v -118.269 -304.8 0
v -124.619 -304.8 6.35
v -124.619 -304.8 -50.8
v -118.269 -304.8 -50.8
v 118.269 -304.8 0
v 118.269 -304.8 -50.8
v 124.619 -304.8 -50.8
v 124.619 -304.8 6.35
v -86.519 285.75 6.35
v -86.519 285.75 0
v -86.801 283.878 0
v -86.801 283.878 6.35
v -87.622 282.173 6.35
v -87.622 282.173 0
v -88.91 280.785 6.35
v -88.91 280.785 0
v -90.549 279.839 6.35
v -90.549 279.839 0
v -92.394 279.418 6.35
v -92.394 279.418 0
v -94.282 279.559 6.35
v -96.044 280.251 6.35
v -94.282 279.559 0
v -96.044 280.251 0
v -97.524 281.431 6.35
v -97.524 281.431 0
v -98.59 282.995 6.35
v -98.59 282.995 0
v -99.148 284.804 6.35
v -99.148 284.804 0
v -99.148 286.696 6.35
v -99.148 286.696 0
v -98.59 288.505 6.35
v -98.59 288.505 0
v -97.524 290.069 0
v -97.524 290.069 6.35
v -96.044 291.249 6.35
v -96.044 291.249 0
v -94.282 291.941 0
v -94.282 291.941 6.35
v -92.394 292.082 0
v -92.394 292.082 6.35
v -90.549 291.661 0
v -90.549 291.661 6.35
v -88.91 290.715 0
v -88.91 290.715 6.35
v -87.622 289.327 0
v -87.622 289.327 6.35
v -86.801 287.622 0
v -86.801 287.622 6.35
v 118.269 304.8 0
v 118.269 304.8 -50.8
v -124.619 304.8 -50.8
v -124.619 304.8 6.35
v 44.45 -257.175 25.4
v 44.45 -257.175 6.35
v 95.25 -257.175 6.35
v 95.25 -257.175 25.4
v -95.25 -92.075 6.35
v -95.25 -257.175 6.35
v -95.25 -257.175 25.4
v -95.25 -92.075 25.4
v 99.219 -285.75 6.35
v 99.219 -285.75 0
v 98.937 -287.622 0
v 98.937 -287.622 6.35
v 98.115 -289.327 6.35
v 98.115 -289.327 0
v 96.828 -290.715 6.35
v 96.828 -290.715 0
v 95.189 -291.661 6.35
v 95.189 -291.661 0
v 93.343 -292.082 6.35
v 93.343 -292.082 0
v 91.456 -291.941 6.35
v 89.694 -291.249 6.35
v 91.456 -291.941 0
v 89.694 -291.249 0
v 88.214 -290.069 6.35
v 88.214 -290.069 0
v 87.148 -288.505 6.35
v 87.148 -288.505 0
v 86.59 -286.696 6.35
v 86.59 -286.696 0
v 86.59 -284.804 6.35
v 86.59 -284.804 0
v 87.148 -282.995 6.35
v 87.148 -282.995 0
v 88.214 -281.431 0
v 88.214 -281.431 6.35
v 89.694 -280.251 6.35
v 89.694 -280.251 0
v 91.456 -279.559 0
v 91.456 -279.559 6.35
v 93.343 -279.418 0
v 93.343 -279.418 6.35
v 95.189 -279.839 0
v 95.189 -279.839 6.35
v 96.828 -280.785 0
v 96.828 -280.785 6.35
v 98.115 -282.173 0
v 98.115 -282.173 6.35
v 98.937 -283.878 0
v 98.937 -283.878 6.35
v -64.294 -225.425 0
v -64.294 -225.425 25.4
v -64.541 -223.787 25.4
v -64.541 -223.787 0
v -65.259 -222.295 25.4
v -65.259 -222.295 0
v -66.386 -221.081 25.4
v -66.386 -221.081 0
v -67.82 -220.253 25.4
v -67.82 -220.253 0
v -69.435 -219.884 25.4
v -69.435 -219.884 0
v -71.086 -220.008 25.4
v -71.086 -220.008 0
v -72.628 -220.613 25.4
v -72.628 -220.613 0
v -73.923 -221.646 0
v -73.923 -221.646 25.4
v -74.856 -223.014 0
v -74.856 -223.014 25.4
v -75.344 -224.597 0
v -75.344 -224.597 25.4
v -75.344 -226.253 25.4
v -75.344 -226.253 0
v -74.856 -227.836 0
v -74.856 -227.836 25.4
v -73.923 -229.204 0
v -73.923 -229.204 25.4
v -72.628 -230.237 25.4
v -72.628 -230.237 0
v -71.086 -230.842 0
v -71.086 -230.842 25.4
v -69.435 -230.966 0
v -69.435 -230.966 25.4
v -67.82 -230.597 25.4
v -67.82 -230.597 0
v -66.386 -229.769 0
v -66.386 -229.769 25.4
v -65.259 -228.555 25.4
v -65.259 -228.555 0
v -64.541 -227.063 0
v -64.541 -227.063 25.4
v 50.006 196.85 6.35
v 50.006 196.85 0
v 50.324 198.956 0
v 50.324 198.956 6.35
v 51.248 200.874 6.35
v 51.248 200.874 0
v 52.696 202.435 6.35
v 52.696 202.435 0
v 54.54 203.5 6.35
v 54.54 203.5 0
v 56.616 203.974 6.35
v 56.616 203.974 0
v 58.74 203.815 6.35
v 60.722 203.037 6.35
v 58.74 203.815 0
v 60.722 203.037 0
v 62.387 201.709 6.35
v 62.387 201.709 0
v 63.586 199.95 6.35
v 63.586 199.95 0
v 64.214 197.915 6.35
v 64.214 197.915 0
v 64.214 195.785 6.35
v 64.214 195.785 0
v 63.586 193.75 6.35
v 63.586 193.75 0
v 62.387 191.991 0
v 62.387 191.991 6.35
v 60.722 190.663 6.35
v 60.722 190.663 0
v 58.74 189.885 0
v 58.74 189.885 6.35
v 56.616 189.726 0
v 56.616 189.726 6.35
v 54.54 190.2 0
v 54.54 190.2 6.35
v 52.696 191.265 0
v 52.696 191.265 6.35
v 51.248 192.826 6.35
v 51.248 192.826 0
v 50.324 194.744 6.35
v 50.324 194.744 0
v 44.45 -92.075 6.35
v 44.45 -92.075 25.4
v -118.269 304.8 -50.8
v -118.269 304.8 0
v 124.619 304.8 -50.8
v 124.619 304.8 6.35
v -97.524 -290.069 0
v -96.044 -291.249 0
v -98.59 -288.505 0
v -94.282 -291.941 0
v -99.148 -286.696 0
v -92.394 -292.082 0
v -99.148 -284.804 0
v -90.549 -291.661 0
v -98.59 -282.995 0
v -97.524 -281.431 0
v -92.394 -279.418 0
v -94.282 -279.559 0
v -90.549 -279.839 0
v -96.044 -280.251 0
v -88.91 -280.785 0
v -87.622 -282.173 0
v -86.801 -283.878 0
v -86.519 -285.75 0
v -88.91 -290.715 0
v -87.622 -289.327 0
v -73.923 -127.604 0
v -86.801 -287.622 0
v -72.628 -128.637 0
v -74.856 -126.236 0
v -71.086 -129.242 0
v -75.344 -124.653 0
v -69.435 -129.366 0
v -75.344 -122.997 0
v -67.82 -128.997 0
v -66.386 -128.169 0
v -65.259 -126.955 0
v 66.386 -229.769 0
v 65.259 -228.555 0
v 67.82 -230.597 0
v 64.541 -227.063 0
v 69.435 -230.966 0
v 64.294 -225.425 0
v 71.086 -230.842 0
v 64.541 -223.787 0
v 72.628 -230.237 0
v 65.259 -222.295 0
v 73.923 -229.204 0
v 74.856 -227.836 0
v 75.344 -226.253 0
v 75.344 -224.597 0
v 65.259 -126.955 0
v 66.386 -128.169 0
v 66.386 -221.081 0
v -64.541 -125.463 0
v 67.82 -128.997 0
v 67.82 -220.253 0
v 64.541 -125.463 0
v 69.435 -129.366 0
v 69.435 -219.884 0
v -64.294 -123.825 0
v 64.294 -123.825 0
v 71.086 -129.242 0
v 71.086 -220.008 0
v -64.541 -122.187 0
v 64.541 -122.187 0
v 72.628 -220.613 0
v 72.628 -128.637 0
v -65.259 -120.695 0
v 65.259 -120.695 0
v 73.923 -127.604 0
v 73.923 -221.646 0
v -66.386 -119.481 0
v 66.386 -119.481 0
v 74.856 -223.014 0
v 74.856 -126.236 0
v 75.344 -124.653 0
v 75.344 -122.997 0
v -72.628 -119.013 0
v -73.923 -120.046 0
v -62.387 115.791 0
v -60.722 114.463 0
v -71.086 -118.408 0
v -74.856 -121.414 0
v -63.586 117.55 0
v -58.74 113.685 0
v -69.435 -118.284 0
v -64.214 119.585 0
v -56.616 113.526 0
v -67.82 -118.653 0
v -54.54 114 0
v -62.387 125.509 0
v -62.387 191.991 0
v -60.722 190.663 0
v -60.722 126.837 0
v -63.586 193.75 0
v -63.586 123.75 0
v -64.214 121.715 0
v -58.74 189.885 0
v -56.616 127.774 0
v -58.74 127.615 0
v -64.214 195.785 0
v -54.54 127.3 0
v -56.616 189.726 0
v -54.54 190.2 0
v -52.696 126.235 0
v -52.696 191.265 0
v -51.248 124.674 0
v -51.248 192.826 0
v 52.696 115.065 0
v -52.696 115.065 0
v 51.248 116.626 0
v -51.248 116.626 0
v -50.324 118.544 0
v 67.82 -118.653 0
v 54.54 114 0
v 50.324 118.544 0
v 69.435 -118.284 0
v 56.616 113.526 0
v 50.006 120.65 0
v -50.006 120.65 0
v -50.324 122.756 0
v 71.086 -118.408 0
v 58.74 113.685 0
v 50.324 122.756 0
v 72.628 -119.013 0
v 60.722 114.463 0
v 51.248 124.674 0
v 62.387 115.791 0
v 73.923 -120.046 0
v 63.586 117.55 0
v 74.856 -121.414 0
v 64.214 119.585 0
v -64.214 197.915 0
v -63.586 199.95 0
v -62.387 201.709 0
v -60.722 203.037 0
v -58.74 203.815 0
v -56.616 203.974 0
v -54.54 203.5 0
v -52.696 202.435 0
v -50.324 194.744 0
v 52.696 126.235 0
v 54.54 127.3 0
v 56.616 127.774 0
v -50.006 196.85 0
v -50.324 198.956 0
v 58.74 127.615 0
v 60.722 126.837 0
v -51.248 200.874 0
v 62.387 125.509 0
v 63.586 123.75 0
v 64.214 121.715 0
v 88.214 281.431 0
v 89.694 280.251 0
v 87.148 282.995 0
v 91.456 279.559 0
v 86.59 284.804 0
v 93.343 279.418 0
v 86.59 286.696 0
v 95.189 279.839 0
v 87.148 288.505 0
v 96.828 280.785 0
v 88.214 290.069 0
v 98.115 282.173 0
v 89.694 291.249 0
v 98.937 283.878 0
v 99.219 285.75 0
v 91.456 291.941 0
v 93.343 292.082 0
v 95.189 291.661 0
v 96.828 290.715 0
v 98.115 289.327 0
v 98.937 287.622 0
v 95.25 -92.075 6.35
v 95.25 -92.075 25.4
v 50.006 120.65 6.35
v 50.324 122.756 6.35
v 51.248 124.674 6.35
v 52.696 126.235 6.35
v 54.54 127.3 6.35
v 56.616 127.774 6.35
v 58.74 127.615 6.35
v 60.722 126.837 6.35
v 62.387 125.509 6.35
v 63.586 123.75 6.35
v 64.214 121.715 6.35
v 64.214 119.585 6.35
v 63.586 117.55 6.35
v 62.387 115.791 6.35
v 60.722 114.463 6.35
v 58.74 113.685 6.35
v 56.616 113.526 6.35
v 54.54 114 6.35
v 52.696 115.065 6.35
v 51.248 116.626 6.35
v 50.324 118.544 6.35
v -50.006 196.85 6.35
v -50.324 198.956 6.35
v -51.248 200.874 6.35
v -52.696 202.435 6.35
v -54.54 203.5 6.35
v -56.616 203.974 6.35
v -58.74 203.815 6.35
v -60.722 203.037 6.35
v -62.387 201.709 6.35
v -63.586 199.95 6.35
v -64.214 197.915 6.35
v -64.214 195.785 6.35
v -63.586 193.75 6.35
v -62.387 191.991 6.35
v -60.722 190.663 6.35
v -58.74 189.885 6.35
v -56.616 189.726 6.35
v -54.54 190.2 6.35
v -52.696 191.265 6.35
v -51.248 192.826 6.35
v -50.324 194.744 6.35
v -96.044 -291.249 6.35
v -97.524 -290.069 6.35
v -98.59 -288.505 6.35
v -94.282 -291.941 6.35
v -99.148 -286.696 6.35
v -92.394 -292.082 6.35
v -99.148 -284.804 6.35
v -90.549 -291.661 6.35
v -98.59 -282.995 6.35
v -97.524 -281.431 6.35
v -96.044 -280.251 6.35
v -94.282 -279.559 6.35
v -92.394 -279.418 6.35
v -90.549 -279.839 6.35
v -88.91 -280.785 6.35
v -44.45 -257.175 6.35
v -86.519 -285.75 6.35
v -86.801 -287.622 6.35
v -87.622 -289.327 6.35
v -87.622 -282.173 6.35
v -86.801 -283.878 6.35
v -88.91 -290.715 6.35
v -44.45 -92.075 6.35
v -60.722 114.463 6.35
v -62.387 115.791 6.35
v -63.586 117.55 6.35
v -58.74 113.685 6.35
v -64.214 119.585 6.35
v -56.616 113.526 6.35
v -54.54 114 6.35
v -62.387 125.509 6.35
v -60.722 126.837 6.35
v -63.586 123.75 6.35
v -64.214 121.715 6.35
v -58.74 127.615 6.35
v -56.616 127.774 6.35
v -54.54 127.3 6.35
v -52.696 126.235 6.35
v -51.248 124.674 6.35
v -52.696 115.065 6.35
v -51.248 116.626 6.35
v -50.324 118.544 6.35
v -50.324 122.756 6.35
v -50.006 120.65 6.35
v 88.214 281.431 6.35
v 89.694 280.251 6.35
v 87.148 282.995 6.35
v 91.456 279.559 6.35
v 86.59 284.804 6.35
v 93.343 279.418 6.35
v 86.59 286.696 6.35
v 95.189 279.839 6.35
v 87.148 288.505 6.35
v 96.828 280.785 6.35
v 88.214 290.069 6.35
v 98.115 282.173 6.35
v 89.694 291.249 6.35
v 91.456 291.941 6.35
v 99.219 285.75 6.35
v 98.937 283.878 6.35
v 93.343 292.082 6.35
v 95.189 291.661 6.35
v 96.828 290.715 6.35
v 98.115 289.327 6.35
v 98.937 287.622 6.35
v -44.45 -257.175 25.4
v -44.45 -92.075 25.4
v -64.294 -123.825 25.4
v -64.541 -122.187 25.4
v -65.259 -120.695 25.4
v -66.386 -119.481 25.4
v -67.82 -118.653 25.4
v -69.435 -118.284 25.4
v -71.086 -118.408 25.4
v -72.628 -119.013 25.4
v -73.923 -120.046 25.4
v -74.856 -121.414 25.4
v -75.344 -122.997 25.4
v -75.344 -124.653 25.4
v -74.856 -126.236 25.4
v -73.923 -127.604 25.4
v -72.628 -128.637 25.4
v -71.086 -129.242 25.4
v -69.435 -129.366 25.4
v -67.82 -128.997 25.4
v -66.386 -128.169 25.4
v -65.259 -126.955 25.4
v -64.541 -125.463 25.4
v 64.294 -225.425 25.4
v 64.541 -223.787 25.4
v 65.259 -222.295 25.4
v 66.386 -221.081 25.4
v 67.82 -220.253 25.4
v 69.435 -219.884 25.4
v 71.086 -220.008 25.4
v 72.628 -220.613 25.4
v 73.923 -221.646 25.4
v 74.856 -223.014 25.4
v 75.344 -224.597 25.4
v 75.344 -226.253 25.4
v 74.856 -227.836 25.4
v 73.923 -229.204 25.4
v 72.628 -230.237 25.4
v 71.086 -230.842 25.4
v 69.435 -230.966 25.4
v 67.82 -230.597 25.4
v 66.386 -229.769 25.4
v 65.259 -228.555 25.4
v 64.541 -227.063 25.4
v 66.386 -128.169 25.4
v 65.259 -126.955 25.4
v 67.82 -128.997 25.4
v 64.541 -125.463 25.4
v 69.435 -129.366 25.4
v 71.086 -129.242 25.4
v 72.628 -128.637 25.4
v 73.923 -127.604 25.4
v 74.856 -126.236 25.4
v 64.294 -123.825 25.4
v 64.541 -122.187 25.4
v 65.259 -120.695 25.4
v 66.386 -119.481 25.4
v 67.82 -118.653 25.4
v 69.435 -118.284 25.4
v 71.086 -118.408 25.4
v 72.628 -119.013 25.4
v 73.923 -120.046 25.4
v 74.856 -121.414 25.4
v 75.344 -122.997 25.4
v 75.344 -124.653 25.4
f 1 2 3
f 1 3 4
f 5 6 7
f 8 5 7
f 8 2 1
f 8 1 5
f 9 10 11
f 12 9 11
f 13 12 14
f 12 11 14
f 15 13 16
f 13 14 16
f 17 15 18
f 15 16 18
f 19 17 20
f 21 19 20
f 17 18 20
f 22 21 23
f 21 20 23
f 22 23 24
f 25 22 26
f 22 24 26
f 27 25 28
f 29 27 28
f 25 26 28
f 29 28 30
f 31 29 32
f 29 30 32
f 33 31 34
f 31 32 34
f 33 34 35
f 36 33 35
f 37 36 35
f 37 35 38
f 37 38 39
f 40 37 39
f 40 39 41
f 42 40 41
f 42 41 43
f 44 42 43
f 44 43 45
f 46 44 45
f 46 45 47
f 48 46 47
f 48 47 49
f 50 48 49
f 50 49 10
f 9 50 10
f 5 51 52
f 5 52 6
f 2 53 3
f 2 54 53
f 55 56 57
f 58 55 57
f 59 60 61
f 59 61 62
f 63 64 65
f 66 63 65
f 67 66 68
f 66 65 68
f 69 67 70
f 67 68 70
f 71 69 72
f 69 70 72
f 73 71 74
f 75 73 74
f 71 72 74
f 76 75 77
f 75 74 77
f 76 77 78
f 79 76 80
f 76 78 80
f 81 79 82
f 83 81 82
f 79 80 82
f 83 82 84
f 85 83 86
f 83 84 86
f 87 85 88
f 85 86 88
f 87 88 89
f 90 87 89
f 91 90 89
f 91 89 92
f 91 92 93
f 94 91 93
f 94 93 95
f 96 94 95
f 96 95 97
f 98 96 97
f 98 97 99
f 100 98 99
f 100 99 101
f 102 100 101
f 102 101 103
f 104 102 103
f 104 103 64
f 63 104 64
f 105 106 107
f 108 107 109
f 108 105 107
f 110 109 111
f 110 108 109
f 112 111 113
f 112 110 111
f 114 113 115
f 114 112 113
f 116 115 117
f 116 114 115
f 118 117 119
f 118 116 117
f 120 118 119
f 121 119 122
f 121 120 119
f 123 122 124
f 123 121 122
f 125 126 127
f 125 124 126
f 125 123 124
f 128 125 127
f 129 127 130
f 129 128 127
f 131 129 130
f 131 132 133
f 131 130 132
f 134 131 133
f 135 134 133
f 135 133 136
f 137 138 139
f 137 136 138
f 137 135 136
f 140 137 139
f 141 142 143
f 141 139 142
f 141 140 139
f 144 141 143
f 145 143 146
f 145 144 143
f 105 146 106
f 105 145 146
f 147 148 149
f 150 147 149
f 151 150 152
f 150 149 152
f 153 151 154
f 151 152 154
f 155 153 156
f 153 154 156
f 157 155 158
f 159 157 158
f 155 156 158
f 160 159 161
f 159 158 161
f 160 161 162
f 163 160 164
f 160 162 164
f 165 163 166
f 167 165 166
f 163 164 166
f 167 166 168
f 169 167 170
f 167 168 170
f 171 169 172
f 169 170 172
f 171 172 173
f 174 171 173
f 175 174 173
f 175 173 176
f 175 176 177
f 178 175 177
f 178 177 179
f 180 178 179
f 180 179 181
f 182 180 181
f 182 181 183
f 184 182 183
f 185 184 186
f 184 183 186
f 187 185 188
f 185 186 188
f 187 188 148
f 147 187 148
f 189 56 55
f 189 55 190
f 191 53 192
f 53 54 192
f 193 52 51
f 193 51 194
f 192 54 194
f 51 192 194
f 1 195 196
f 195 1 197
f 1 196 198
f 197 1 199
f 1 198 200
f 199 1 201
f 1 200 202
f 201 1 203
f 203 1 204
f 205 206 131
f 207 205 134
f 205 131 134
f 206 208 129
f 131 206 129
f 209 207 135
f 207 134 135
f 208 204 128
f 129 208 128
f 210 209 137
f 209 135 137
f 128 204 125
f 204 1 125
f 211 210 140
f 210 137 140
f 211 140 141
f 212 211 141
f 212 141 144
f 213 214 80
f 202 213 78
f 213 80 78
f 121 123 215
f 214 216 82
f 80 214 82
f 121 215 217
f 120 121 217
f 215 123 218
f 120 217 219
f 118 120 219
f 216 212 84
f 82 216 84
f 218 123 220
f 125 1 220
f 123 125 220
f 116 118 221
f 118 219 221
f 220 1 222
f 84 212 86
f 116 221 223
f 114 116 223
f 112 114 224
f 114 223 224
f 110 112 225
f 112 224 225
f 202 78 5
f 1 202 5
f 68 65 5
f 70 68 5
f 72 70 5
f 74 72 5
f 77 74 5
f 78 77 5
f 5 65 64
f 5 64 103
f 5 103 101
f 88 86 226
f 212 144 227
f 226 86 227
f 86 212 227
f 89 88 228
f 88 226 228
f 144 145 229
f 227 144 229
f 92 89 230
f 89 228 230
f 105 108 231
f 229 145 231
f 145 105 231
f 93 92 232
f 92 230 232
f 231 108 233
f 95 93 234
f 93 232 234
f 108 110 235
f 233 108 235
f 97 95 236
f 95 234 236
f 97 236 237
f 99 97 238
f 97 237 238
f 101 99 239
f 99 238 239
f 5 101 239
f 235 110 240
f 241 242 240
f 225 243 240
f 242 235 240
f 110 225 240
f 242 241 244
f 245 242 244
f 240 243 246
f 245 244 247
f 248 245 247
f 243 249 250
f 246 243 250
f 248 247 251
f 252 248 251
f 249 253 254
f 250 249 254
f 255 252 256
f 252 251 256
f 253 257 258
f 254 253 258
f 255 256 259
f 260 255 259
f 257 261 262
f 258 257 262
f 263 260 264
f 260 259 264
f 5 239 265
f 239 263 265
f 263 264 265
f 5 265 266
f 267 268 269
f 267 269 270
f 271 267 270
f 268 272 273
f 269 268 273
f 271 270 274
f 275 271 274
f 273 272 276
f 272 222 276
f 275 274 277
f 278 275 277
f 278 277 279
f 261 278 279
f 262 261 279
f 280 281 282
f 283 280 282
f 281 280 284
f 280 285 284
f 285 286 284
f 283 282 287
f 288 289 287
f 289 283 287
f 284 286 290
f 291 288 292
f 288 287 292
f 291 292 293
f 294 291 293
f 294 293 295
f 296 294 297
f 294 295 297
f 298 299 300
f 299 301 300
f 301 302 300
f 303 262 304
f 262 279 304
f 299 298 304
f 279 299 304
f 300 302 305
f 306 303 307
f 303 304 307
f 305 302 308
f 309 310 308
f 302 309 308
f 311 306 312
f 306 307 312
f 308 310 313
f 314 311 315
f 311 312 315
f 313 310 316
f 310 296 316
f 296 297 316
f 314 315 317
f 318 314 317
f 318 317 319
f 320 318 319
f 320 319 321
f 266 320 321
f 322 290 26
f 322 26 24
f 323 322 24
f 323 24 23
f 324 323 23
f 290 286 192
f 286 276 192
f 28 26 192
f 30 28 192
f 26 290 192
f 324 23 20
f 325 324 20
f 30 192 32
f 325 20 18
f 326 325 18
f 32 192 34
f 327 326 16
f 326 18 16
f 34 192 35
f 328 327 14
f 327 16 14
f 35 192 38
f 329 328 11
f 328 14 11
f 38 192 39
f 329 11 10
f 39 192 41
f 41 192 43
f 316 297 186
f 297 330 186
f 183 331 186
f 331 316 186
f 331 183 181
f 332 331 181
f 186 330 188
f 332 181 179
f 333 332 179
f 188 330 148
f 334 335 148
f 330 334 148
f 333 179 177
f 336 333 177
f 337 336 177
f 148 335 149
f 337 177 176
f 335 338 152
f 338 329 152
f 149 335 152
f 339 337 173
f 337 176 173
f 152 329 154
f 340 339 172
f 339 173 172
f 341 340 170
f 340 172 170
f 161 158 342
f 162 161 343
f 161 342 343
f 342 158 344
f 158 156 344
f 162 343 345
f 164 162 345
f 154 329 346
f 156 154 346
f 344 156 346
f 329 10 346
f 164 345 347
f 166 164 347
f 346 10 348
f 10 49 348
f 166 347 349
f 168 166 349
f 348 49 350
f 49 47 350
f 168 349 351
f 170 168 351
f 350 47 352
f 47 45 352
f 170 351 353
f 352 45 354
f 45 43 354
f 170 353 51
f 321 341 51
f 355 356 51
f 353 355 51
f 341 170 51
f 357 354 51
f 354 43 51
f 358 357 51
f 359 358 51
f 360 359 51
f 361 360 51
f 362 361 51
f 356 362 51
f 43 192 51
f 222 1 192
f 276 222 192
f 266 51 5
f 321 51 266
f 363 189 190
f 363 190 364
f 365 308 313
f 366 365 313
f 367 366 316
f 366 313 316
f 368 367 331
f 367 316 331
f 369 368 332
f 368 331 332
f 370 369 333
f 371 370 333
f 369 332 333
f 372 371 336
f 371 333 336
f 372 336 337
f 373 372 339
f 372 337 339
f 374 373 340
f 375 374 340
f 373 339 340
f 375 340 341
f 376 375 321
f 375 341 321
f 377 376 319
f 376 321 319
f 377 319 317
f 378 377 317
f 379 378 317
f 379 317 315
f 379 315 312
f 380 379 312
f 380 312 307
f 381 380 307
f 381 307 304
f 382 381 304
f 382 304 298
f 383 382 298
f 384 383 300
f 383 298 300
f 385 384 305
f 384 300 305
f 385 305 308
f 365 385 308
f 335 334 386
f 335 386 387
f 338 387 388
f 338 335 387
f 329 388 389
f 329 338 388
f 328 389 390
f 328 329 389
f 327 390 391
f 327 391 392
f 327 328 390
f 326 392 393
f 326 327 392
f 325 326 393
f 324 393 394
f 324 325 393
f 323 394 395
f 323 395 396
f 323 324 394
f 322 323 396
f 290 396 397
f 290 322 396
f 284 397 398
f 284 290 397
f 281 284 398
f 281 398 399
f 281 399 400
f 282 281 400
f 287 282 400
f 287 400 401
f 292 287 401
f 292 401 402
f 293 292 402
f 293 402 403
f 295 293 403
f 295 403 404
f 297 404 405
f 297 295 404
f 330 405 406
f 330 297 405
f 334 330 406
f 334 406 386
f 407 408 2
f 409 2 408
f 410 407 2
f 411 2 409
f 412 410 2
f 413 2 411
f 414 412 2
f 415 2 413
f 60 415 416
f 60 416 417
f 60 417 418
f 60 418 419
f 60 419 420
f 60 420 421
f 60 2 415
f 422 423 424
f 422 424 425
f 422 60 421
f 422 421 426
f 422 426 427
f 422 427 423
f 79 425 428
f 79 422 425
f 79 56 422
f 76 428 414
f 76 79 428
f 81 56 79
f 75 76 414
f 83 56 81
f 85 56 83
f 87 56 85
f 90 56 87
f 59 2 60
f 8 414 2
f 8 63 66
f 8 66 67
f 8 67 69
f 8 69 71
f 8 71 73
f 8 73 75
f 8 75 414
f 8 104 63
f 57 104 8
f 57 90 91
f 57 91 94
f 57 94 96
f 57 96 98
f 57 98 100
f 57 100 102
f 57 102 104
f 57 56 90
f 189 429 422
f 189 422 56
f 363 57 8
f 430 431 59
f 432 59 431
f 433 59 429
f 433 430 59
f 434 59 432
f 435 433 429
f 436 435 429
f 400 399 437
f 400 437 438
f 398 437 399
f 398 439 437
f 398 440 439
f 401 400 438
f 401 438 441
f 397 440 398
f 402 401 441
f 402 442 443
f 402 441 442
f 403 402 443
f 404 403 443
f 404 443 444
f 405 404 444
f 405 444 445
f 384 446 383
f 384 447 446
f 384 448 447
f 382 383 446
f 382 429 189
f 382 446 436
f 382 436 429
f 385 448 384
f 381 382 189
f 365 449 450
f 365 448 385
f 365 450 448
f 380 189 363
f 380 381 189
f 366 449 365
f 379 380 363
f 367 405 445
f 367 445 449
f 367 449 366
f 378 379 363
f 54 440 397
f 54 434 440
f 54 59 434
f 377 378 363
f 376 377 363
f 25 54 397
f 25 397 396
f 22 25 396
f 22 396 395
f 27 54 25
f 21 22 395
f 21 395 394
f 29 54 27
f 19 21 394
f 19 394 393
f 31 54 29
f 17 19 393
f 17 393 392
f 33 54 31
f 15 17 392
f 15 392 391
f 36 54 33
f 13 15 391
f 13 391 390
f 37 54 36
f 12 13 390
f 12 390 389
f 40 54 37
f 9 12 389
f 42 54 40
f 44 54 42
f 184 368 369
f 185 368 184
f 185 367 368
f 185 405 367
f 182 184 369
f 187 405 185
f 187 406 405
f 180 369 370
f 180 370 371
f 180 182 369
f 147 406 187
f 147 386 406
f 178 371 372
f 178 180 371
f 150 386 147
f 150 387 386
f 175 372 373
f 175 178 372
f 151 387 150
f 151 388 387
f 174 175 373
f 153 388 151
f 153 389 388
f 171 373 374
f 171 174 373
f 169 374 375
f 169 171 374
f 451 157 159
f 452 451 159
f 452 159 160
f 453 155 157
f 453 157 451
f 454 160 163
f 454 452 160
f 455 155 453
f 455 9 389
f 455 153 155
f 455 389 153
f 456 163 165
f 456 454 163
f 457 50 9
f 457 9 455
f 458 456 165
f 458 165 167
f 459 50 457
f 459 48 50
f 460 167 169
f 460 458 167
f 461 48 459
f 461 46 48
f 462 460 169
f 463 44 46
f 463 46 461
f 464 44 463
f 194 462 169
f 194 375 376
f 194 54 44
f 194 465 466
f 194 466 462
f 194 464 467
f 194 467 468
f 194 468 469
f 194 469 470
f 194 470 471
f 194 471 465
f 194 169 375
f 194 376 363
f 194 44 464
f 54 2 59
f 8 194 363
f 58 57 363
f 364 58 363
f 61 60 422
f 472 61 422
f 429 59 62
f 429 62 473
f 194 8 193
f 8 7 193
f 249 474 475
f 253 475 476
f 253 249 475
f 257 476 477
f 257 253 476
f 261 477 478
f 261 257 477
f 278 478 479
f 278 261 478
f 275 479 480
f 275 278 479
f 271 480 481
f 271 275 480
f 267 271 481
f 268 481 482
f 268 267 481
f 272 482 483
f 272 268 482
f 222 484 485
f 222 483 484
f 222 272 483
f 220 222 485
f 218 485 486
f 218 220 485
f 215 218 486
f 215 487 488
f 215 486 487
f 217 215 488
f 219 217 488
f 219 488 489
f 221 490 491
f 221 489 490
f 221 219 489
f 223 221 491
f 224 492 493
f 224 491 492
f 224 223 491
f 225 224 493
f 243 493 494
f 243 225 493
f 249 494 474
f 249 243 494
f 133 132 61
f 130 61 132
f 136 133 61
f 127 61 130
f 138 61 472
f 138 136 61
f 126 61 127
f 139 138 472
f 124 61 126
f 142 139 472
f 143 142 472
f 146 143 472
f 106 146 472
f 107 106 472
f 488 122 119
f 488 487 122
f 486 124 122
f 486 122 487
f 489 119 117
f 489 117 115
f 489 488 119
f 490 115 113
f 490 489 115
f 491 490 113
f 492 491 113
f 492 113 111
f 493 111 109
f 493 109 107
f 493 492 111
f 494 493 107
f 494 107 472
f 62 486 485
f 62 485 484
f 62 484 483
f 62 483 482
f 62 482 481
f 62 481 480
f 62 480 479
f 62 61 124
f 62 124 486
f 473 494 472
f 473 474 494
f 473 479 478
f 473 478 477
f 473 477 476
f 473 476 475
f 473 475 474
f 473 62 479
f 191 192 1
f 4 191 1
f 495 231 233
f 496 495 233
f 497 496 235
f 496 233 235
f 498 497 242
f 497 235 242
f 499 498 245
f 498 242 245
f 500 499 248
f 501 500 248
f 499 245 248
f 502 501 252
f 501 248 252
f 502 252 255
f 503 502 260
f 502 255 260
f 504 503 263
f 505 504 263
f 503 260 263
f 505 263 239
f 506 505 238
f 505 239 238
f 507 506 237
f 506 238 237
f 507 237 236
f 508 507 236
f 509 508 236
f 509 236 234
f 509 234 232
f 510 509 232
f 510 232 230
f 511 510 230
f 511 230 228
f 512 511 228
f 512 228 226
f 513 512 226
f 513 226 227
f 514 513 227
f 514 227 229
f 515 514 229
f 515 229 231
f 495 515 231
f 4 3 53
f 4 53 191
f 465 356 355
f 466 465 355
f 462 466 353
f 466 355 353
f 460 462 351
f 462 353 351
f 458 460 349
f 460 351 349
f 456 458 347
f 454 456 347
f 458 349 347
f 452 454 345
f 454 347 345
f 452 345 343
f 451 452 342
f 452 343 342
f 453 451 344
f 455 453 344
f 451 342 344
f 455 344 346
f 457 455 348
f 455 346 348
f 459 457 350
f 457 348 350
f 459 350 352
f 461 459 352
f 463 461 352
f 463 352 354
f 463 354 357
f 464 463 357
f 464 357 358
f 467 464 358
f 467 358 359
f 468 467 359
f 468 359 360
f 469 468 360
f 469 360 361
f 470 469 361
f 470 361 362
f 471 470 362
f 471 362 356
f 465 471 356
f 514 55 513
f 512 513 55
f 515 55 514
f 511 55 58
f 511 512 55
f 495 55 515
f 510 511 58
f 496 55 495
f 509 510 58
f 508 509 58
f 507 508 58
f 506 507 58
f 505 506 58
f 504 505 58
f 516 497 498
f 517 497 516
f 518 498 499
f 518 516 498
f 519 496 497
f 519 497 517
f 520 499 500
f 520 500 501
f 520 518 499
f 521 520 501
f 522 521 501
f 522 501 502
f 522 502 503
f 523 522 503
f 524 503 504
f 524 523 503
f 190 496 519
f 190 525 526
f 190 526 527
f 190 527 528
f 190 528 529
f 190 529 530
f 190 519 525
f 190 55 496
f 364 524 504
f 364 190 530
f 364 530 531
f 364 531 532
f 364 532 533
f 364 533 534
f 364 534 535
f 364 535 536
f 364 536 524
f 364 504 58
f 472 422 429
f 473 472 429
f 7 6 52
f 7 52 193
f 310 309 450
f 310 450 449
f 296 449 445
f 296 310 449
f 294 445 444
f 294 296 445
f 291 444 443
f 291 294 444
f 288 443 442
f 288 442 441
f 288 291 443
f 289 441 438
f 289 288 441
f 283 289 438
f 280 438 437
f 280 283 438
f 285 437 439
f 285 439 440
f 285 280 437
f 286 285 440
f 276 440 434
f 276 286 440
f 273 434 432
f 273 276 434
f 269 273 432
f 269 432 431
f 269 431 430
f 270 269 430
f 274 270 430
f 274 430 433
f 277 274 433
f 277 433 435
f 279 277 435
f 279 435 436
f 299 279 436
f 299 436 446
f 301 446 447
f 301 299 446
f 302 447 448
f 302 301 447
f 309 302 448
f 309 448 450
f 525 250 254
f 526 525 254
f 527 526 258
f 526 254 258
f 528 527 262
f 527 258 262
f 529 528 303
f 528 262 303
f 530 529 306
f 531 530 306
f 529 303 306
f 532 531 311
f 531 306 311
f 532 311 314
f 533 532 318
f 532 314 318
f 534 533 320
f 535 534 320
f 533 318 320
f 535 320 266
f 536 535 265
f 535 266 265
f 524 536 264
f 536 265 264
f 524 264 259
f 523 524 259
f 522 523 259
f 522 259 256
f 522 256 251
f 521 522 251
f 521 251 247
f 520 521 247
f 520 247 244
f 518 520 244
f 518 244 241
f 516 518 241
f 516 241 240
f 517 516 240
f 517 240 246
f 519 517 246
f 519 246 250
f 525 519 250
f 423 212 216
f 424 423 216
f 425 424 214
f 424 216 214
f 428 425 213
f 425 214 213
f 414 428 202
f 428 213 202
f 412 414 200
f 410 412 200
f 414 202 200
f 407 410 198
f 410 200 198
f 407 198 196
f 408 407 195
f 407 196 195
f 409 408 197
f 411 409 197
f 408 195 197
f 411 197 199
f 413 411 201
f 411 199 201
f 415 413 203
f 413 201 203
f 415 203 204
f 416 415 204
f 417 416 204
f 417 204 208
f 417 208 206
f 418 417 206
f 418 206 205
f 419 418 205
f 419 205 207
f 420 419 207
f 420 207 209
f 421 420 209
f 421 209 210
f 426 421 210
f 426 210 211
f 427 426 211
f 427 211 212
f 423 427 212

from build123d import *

# Parameters (mm, degrees)
F0_R     = 5.55625
F0_R_2   = 7.14375
F1_DEPTH = 6.35
F2_W     = 6.35
F2_H     = 609.6
F3_DEPTH = 50.8
F4_W     = 50.8
F4_H     = 165.1
F5_DEPTH = 19.05
F6_DEPTH = 25.4
F7_R     = 6.35
F8_DEPTH = 25.4


with BuildPart() as f1:
    # F0 (on Top) → F1 (new body)
    with BuildSketch(Plane.XY):
        Polygon((-124.61875, 304.8), (-124.61875, -304.8), (124.61875, -304.8), (124.61875, 304.8), (0, 304.8), align=None)
        with Locations((-69.85, -225.425)):
            Circle(F0_R, mode=Mode.SUBTRACT)
        with Locations((-69.85, -123.825)):
            Circle(F0_R, mode=Mode.SUBTRACT)
        with BuildLine():
            ThreePointArc((75.40625, -225.425), (69.85, -230.98125), (64.29375, -225.425))
            ThreePointArc((64.29375, -225.425), (69.85, -219.86875), (75.40625, -225.425))
        make_face(mode=Mode.SUBTRACT)
        with BuildLine():
            ThreePointArc((75.40625, -123.825), (69.85, -129.38125), (64.29375, -123.825))
            ThreePointArc((64.29375, -123.825), (69.85, -118.26875), (75.40625, -123.825))
        make_face(mode=Mode.SUBTRACT)
        with Locations((-57.15, 120.65)):
            Circle(F0_R_2, mode=Mode.SUBTRACT)
        with Locations((-57.15, 196.85)):
            Circle(F0_R_2, mode=Mode.SUBTRACT)
        with BuildLine():
            ThreePointArc((64.29375, 120.65), (57.15, 113.50625), (50.00625, 120.65))
            ThreePointArc((50.00625, 120.65), (57.15, 127.79375), (64.29375, 120.65))
        make_face(mode=Mode.SUBTRACT)
        with BuildLine():
            ThreePointArc((64.29375, 196.85), (57.15, 189.70625), (50.00625, 196.85))
            ThreePointArc((50.00625, 196.85), (57.15, 203.99375), (64.29375, 196.85))
        make_face(mode=Mode.SUBTRACT)
    extrude(amount=F1_DEPTH)

    # F2 (on face) → F3 (join)
    with BuildSketch(Plane(origin=(0, 0, 0), x_dir=(1, 0, 0), z_dir=(0, 0, -1))):
        with Locations((-121.44375, 0)):
            Rectangle(F2_W, F2_H)
        with Locations((121.44375, 0)):
            Rectangle(F2_W, F2_H)
    extrude(amount=F3_DEPTH)

    # F4 (on face) → F5 (join)
    with BuildSketch(Plane.XY.offset(6.35)):
        with Locations((-69.85, -174.625)):
            Rectangle(F4_W, F4_H)
        with Locations((69.85, -174.625)):
            Rectangle(F4_W, F4_H)
    extrude(amount=F5_DEPTH)

    # F6 (cut): faces of the model
    f6_faces = [f1.faces().sort_by_distance(p)[0] for p in [
        (-69.85, -123.825, 6.35),
        (-69.85, -225.425, 6.35),
        (69.85, -225.425, 6.35),
        (69.85, -123.825, 6.35),
    ]]
    extrude(f6_faces, amount=-F6_DEPTH, mode=Mode.SUBTRACT)

    # F7 (on face) → F8 (cut)
    with BuildSketch(Plane(origin=(0, 0, 0), x_dir=(1, 0, 0), z_dir=(0, 0, -1))):
        with Locations((-92.86875, 285.75)):
            Circle(F7_R)
        with Locations((92.86875, 285.75)):
            Circle(F7_R)
        with Locations((92.86875, -285.75)):
            Circle(F7_R)
        with Locations((-92.86875, -285.75)):
            Circle(F7_R)
    extrude(amount=-F8_DEPTH, mode=Mode.SUBTRACT)


solid = f1.part
